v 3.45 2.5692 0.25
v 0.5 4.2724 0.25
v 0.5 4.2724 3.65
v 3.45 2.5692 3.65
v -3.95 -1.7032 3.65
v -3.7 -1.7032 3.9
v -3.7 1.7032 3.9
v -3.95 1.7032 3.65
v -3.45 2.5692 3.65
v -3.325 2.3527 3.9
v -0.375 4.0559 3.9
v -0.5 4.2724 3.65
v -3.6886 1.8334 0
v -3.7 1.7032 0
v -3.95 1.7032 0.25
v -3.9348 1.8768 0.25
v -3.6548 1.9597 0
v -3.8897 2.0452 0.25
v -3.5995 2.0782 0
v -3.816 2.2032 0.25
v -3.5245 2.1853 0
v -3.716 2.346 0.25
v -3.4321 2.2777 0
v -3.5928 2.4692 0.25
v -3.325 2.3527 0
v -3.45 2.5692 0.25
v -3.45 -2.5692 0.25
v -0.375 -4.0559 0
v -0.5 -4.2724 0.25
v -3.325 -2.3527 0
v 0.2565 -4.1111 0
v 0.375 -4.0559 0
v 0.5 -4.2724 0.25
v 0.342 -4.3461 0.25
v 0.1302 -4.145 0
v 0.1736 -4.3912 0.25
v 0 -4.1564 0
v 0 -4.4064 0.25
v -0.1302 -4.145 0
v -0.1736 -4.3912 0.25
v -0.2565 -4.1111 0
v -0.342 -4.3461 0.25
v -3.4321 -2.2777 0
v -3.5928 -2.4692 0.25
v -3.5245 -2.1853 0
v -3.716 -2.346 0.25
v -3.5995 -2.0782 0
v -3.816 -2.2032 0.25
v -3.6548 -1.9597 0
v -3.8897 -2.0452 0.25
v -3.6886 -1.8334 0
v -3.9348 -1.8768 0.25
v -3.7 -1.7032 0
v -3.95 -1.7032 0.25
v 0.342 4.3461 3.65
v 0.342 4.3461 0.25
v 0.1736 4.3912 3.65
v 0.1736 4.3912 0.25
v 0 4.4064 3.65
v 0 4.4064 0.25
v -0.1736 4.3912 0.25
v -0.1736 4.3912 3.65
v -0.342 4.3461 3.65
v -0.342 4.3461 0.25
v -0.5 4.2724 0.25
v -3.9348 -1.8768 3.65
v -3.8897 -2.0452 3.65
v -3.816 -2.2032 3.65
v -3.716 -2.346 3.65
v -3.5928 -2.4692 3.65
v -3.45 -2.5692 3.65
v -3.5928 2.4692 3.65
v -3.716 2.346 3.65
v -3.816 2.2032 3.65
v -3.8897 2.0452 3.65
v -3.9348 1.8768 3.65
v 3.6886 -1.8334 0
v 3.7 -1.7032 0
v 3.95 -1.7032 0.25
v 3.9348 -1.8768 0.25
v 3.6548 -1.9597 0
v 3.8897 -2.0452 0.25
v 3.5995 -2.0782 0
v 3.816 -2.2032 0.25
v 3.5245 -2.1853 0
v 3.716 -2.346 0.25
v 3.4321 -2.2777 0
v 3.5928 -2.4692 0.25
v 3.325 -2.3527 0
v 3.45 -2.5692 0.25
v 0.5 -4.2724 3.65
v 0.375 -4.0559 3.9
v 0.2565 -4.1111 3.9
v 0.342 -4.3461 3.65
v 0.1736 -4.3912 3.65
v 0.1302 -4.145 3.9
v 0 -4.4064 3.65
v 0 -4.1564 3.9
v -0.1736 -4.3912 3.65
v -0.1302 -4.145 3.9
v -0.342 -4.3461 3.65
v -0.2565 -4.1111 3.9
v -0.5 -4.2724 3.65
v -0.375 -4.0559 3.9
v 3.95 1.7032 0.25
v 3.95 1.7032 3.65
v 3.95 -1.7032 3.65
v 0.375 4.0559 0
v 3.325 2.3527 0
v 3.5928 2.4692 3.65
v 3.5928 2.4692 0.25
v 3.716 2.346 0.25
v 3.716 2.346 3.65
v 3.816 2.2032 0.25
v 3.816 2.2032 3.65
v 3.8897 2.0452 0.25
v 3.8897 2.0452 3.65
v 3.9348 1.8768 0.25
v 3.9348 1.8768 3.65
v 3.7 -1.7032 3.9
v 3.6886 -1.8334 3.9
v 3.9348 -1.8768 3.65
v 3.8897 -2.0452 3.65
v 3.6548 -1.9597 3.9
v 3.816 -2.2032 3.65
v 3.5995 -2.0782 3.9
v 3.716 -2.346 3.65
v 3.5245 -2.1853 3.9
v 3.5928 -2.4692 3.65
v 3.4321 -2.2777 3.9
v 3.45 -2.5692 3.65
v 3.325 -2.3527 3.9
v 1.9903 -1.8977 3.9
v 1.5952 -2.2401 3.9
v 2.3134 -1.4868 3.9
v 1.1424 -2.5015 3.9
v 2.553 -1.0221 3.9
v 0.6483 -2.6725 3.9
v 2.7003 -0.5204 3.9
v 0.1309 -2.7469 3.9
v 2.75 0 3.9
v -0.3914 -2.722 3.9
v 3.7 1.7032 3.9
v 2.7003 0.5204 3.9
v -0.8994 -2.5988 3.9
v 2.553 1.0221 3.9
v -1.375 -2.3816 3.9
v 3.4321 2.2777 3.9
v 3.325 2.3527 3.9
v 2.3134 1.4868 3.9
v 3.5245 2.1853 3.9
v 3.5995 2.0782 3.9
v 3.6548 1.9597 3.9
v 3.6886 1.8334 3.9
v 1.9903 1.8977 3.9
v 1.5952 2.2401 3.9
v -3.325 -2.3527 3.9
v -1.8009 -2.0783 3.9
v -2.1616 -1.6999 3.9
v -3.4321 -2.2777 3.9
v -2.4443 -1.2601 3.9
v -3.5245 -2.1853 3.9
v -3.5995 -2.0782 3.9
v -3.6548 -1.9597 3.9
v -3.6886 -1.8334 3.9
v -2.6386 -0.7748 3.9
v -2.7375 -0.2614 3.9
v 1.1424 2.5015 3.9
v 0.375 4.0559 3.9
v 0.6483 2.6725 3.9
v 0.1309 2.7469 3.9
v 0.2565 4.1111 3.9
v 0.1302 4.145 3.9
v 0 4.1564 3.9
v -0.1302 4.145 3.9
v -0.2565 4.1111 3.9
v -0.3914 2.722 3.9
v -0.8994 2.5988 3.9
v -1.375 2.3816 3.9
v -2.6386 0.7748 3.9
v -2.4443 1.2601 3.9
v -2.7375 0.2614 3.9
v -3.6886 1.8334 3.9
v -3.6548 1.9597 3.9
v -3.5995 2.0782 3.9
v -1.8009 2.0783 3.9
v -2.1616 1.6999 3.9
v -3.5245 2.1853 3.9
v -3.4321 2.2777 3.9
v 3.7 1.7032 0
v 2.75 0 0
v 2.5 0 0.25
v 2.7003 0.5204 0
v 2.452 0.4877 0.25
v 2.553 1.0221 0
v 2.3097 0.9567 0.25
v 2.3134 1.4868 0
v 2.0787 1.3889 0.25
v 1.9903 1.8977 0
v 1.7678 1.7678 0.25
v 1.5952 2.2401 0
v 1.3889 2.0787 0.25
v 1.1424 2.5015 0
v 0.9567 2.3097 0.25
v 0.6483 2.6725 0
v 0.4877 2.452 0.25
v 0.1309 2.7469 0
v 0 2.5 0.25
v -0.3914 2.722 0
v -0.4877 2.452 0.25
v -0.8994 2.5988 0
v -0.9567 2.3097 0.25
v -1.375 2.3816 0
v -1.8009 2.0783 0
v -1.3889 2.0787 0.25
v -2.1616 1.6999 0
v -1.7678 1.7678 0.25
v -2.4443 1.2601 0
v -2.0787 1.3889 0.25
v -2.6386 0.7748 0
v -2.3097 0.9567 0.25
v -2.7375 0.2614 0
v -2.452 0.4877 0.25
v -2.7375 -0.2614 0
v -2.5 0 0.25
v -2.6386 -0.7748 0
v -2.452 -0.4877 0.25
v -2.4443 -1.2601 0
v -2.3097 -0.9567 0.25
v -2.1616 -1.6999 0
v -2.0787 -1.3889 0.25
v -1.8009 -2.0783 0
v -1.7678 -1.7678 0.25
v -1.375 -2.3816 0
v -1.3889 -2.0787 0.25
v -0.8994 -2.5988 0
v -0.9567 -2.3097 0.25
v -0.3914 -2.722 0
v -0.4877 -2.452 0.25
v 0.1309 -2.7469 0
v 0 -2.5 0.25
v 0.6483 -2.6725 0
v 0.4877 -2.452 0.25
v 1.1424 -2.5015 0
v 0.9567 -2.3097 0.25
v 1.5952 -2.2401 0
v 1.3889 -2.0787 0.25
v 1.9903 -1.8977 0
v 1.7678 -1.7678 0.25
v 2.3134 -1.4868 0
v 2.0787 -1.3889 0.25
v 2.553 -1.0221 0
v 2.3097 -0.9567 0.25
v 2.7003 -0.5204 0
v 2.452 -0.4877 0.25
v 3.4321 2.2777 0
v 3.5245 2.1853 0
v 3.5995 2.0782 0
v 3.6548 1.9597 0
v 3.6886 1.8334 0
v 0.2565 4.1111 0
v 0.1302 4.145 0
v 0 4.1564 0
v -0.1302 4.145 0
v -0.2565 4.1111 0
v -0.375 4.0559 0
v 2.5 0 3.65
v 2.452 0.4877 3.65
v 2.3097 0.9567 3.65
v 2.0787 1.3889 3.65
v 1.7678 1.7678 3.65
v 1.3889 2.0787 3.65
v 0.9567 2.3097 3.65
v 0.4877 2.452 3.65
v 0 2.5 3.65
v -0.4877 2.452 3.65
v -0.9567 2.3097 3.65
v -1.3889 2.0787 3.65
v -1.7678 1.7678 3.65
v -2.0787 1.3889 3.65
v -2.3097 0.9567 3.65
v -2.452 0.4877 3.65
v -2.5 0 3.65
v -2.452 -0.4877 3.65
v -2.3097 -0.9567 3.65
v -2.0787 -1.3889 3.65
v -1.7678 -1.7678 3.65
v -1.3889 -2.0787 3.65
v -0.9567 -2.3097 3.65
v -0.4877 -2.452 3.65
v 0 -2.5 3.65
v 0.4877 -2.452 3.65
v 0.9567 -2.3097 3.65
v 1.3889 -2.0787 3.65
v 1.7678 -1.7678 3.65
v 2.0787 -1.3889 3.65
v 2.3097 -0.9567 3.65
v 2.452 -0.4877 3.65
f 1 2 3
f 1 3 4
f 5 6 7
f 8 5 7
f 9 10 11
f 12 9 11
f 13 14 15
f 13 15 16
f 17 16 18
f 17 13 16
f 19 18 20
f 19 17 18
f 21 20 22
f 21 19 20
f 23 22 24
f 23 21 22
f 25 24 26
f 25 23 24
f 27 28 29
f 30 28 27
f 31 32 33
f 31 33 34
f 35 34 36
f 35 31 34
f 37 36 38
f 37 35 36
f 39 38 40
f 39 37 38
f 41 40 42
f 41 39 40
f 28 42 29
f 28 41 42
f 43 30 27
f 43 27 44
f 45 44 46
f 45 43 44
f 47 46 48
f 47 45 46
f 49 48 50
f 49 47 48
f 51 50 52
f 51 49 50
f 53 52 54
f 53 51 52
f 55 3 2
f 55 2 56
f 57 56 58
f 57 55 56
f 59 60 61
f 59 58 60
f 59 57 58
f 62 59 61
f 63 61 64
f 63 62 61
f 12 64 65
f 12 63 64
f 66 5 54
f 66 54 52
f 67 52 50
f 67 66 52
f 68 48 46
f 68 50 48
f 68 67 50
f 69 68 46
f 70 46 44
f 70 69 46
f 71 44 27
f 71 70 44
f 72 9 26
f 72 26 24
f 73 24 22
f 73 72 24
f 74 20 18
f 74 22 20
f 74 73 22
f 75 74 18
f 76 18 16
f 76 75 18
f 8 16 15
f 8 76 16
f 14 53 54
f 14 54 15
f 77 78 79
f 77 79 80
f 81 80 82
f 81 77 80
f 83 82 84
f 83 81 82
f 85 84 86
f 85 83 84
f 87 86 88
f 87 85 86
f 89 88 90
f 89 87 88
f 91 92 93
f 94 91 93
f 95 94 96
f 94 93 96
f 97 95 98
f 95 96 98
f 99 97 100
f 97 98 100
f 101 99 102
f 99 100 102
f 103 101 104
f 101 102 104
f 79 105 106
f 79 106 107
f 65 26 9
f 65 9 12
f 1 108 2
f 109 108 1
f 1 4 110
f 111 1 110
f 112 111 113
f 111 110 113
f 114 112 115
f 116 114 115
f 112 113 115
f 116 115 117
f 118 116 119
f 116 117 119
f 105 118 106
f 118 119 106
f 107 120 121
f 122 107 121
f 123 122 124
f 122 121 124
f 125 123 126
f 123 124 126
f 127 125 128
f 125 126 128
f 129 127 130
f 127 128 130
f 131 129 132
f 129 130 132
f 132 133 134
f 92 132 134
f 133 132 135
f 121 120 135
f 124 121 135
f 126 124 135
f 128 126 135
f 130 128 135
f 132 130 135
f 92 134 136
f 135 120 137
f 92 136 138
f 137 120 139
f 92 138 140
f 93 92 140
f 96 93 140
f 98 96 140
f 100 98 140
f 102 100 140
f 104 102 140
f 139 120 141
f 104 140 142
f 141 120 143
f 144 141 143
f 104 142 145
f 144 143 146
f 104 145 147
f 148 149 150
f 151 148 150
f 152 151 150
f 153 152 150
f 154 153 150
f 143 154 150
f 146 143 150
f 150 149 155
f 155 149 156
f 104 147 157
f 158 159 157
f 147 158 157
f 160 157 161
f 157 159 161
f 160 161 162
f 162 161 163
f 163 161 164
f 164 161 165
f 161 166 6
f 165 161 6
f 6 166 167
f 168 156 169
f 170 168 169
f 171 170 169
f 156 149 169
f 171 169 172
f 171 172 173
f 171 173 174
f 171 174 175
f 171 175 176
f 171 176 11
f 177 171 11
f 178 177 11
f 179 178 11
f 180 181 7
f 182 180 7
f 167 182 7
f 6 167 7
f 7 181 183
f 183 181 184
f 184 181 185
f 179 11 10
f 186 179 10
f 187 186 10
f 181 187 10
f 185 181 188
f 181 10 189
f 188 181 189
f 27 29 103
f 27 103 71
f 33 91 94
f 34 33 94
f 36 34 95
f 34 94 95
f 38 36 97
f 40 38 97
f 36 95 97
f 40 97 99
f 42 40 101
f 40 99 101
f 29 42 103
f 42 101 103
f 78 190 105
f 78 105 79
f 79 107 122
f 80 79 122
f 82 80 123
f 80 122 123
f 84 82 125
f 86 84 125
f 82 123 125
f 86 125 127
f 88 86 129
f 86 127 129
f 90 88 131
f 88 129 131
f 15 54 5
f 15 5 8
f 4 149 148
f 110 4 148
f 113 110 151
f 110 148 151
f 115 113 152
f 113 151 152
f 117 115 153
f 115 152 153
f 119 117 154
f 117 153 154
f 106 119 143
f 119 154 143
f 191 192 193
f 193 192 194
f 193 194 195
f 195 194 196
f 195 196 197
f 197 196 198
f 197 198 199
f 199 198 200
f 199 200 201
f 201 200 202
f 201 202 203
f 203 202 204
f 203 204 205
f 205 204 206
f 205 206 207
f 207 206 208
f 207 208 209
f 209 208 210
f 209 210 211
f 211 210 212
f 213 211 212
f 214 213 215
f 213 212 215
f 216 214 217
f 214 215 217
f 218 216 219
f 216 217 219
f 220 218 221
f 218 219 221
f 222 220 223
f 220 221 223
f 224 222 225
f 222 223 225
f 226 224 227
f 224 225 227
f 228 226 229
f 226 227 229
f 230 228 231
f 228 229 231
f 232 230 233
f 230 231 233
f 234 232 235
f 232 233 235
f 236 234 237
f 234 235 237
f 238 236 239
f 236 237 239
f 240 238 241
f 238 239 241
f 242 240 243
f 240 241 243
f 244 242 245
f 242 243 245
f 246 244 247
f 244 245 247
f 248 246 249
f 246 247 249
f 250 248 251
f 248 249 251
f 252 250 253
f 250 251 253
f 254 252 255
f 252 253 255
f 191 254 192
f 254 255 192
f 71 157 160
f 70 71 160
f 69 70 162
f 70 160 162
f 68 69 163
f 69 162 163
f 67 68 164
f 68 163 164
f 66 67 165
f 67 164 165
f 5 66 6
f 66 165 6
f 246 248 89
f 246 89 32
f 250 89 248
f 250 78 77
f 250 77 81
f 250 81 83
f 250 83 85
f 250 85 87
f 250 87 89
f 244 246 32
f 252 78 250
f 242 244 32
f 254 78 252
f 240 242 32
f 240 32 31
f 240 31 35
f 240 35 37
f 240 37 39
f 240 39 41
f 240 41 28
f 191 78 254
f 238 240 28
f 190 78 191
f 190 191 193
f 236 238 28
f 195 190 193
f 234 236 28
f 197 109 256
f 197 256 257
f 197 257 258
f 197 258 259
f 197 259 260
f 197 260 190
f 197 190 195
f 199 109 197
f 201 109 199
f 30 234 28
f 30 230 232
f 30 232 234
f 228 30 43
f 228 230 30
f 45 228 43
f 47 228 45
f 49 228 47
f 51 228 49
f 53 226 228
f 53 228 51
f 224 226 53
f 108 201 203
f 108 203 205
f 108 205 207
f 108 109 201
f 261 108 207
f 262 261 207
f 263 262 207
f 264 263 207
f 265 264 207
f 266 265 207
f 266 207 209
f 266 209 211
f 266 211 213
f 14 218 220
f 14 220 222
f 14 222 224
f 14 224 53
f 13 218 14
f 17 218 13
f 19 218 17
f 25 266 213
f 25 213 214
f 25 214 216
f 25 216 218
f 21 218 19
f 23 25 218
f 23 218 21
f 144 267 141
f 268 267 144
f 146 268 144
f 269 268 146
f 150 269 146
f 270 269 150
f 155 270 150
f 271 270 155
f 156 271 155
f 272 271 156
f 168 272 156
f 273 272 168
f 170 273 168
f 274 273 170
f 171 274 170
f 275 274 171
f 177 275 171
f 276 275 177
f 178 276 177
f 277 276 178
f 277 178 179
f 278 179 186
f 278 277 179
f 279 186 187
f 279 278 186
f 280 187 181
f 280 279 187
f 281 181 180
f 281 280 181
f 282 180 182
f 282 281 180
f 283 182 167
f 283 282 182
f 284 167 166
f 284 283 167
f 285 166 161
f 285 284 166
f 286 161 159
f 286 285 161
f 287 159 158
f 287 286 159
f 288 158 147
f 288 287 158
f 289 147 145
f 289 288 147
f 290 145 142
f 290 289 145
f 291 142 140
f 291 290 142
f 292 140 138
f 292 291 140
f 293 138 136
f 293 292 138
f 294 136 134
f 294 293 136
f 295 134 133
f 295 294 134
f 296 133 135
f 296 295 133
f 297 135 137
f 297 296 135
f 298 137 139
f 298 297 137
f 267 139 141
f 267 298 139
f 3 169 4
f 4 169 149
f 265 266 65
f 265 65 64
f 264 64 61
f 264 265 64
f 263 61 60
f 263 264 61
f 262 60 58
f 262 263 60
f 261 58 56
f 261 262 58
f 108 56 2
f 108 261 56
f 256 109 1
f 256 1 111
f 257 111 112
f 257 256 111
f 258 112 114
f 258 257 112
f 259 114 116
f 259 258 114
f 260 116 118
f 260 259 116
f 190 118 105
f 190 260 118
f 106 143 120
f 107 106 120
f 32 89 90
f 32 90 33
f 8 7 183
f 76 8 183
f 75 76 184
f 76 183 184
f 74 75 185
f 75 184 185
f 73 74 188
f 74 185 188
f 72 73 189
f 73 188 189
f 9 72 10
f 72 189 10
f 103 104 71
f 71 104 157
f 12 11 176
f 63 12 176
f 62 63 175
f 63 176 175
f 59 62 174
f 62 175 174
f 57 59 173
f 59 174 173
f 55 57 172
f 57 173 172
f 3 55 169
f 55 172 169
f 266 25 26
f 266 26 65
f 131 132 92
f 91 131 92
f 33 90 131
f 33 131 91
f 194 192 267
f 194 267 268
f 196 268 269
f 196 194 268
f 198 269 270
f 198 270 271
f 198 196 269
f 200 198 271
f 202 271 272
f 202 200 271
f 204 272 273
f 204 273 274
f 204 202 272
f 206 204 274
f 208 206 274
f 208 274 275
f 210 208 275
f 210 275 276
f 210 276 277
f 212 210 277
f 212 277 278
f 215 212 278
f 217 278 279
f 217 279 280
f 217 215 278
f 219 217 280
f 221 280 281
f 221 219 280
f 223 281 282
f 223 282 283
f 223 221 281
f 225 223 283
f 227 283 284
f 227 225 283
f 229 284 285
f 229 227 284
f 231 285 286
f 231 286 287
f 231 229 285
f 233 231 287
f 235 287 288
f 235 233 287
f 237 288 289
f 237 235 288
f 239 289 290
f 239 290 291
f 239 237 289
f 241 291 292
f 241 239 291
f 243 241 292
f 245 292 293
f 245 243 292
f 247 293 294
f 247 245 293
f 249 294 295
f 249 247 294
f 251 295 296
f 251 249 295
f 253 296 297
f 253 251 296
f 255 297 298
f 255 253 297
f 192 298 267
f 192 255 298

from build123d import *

# Parameters (mm, degrees)
SKIZZE1_R                       = 2.5
AUFSATZ_LINEAR_AUSTRAGEN1_DEPTH = 3.9
VERRUNDUNG1_R                   = 1
FASE1_SIZE                      = 0.25


with BuildPart() as part:
    # Skizze1 → Aufsatz-Linear austragen1 (new body)
    with BuildSketch(Plane.XY):
        Polygon((0, 4.561067127), (3.95, 2.280533563), (3.95, -2.280533563), (0, -4.561067127), (-3.95, -2.280533563), (-3.95, 2.280533563), align=None)
        Circle(SKIZZE1_R, mode=Mode.SUBTRACT)
    extrude(amount=AUFSATZ_LINEAR_AUSTRAGEN1_DEPTH)

    # Verrundung1
    verrundung1_edges = [part.edges().sort_by_distance(p)[0] for p in [
        (0, 4.561067127, 1.95),
        (3.95, 2.280533563, 1.95),
        (3.95, -2.280533563, 1.95),
        (0, -4.561067127, 1.95),
        (-3.95, -2.280533563, 1.95),
        (-3.95, 2.280533563, 1.95),
    ]]
    fillet(verrundung1_edges, radius=VERRUNDUNG1_R)

    # Fase1
    fase1_edges = [part.edges().sort_by_distance(p)[0] for p in [
        (-2.5, 0, 0),
        (-2.5, 0, 3.9),
        (1.975, 3.420800345, 0),
        (1.975, 3.420800345, 3.9),
        (-1.975, 3.420800345, 0),
        (3.95, 0, 0),
        (1.975, -3.420800345, 0),
        (-1.975, -3.420800345, 0),
        (-3.95, 0, 0),
        (0, 4.406366588, 0),
        (-3.816025404, 2.203183294, 0),
        (-3.816025404, -2.203183294, 0),
        (0, -4.406366588, 0),
        (3.816025404, -2.203183294, 0),
        (3.816025404, 2.203183294, 0),
        (3.95, 0, 3.9),
        (-1.975, 3.420800345, 3.9),
        (-3.95, 0, 3.9),
        (-1.975, -3.420800345, 3.9),
        (1.975, -3.420800345, 3.9),
        (0, 4.406366588, 3.9),
        (-3.816025404, 2.203183294, 3.9),
        (-3.816025404, -2.203183294, 3.9),
        (0, -4.406366588, 3.9),
        (3.816025404, -2.203183294, 3.9),
        (3.816025404, 2.203183294, 3.9),
    ]]
    chamfer(fase1_edges, length=FASE1_SIZE)


solid = part.part
